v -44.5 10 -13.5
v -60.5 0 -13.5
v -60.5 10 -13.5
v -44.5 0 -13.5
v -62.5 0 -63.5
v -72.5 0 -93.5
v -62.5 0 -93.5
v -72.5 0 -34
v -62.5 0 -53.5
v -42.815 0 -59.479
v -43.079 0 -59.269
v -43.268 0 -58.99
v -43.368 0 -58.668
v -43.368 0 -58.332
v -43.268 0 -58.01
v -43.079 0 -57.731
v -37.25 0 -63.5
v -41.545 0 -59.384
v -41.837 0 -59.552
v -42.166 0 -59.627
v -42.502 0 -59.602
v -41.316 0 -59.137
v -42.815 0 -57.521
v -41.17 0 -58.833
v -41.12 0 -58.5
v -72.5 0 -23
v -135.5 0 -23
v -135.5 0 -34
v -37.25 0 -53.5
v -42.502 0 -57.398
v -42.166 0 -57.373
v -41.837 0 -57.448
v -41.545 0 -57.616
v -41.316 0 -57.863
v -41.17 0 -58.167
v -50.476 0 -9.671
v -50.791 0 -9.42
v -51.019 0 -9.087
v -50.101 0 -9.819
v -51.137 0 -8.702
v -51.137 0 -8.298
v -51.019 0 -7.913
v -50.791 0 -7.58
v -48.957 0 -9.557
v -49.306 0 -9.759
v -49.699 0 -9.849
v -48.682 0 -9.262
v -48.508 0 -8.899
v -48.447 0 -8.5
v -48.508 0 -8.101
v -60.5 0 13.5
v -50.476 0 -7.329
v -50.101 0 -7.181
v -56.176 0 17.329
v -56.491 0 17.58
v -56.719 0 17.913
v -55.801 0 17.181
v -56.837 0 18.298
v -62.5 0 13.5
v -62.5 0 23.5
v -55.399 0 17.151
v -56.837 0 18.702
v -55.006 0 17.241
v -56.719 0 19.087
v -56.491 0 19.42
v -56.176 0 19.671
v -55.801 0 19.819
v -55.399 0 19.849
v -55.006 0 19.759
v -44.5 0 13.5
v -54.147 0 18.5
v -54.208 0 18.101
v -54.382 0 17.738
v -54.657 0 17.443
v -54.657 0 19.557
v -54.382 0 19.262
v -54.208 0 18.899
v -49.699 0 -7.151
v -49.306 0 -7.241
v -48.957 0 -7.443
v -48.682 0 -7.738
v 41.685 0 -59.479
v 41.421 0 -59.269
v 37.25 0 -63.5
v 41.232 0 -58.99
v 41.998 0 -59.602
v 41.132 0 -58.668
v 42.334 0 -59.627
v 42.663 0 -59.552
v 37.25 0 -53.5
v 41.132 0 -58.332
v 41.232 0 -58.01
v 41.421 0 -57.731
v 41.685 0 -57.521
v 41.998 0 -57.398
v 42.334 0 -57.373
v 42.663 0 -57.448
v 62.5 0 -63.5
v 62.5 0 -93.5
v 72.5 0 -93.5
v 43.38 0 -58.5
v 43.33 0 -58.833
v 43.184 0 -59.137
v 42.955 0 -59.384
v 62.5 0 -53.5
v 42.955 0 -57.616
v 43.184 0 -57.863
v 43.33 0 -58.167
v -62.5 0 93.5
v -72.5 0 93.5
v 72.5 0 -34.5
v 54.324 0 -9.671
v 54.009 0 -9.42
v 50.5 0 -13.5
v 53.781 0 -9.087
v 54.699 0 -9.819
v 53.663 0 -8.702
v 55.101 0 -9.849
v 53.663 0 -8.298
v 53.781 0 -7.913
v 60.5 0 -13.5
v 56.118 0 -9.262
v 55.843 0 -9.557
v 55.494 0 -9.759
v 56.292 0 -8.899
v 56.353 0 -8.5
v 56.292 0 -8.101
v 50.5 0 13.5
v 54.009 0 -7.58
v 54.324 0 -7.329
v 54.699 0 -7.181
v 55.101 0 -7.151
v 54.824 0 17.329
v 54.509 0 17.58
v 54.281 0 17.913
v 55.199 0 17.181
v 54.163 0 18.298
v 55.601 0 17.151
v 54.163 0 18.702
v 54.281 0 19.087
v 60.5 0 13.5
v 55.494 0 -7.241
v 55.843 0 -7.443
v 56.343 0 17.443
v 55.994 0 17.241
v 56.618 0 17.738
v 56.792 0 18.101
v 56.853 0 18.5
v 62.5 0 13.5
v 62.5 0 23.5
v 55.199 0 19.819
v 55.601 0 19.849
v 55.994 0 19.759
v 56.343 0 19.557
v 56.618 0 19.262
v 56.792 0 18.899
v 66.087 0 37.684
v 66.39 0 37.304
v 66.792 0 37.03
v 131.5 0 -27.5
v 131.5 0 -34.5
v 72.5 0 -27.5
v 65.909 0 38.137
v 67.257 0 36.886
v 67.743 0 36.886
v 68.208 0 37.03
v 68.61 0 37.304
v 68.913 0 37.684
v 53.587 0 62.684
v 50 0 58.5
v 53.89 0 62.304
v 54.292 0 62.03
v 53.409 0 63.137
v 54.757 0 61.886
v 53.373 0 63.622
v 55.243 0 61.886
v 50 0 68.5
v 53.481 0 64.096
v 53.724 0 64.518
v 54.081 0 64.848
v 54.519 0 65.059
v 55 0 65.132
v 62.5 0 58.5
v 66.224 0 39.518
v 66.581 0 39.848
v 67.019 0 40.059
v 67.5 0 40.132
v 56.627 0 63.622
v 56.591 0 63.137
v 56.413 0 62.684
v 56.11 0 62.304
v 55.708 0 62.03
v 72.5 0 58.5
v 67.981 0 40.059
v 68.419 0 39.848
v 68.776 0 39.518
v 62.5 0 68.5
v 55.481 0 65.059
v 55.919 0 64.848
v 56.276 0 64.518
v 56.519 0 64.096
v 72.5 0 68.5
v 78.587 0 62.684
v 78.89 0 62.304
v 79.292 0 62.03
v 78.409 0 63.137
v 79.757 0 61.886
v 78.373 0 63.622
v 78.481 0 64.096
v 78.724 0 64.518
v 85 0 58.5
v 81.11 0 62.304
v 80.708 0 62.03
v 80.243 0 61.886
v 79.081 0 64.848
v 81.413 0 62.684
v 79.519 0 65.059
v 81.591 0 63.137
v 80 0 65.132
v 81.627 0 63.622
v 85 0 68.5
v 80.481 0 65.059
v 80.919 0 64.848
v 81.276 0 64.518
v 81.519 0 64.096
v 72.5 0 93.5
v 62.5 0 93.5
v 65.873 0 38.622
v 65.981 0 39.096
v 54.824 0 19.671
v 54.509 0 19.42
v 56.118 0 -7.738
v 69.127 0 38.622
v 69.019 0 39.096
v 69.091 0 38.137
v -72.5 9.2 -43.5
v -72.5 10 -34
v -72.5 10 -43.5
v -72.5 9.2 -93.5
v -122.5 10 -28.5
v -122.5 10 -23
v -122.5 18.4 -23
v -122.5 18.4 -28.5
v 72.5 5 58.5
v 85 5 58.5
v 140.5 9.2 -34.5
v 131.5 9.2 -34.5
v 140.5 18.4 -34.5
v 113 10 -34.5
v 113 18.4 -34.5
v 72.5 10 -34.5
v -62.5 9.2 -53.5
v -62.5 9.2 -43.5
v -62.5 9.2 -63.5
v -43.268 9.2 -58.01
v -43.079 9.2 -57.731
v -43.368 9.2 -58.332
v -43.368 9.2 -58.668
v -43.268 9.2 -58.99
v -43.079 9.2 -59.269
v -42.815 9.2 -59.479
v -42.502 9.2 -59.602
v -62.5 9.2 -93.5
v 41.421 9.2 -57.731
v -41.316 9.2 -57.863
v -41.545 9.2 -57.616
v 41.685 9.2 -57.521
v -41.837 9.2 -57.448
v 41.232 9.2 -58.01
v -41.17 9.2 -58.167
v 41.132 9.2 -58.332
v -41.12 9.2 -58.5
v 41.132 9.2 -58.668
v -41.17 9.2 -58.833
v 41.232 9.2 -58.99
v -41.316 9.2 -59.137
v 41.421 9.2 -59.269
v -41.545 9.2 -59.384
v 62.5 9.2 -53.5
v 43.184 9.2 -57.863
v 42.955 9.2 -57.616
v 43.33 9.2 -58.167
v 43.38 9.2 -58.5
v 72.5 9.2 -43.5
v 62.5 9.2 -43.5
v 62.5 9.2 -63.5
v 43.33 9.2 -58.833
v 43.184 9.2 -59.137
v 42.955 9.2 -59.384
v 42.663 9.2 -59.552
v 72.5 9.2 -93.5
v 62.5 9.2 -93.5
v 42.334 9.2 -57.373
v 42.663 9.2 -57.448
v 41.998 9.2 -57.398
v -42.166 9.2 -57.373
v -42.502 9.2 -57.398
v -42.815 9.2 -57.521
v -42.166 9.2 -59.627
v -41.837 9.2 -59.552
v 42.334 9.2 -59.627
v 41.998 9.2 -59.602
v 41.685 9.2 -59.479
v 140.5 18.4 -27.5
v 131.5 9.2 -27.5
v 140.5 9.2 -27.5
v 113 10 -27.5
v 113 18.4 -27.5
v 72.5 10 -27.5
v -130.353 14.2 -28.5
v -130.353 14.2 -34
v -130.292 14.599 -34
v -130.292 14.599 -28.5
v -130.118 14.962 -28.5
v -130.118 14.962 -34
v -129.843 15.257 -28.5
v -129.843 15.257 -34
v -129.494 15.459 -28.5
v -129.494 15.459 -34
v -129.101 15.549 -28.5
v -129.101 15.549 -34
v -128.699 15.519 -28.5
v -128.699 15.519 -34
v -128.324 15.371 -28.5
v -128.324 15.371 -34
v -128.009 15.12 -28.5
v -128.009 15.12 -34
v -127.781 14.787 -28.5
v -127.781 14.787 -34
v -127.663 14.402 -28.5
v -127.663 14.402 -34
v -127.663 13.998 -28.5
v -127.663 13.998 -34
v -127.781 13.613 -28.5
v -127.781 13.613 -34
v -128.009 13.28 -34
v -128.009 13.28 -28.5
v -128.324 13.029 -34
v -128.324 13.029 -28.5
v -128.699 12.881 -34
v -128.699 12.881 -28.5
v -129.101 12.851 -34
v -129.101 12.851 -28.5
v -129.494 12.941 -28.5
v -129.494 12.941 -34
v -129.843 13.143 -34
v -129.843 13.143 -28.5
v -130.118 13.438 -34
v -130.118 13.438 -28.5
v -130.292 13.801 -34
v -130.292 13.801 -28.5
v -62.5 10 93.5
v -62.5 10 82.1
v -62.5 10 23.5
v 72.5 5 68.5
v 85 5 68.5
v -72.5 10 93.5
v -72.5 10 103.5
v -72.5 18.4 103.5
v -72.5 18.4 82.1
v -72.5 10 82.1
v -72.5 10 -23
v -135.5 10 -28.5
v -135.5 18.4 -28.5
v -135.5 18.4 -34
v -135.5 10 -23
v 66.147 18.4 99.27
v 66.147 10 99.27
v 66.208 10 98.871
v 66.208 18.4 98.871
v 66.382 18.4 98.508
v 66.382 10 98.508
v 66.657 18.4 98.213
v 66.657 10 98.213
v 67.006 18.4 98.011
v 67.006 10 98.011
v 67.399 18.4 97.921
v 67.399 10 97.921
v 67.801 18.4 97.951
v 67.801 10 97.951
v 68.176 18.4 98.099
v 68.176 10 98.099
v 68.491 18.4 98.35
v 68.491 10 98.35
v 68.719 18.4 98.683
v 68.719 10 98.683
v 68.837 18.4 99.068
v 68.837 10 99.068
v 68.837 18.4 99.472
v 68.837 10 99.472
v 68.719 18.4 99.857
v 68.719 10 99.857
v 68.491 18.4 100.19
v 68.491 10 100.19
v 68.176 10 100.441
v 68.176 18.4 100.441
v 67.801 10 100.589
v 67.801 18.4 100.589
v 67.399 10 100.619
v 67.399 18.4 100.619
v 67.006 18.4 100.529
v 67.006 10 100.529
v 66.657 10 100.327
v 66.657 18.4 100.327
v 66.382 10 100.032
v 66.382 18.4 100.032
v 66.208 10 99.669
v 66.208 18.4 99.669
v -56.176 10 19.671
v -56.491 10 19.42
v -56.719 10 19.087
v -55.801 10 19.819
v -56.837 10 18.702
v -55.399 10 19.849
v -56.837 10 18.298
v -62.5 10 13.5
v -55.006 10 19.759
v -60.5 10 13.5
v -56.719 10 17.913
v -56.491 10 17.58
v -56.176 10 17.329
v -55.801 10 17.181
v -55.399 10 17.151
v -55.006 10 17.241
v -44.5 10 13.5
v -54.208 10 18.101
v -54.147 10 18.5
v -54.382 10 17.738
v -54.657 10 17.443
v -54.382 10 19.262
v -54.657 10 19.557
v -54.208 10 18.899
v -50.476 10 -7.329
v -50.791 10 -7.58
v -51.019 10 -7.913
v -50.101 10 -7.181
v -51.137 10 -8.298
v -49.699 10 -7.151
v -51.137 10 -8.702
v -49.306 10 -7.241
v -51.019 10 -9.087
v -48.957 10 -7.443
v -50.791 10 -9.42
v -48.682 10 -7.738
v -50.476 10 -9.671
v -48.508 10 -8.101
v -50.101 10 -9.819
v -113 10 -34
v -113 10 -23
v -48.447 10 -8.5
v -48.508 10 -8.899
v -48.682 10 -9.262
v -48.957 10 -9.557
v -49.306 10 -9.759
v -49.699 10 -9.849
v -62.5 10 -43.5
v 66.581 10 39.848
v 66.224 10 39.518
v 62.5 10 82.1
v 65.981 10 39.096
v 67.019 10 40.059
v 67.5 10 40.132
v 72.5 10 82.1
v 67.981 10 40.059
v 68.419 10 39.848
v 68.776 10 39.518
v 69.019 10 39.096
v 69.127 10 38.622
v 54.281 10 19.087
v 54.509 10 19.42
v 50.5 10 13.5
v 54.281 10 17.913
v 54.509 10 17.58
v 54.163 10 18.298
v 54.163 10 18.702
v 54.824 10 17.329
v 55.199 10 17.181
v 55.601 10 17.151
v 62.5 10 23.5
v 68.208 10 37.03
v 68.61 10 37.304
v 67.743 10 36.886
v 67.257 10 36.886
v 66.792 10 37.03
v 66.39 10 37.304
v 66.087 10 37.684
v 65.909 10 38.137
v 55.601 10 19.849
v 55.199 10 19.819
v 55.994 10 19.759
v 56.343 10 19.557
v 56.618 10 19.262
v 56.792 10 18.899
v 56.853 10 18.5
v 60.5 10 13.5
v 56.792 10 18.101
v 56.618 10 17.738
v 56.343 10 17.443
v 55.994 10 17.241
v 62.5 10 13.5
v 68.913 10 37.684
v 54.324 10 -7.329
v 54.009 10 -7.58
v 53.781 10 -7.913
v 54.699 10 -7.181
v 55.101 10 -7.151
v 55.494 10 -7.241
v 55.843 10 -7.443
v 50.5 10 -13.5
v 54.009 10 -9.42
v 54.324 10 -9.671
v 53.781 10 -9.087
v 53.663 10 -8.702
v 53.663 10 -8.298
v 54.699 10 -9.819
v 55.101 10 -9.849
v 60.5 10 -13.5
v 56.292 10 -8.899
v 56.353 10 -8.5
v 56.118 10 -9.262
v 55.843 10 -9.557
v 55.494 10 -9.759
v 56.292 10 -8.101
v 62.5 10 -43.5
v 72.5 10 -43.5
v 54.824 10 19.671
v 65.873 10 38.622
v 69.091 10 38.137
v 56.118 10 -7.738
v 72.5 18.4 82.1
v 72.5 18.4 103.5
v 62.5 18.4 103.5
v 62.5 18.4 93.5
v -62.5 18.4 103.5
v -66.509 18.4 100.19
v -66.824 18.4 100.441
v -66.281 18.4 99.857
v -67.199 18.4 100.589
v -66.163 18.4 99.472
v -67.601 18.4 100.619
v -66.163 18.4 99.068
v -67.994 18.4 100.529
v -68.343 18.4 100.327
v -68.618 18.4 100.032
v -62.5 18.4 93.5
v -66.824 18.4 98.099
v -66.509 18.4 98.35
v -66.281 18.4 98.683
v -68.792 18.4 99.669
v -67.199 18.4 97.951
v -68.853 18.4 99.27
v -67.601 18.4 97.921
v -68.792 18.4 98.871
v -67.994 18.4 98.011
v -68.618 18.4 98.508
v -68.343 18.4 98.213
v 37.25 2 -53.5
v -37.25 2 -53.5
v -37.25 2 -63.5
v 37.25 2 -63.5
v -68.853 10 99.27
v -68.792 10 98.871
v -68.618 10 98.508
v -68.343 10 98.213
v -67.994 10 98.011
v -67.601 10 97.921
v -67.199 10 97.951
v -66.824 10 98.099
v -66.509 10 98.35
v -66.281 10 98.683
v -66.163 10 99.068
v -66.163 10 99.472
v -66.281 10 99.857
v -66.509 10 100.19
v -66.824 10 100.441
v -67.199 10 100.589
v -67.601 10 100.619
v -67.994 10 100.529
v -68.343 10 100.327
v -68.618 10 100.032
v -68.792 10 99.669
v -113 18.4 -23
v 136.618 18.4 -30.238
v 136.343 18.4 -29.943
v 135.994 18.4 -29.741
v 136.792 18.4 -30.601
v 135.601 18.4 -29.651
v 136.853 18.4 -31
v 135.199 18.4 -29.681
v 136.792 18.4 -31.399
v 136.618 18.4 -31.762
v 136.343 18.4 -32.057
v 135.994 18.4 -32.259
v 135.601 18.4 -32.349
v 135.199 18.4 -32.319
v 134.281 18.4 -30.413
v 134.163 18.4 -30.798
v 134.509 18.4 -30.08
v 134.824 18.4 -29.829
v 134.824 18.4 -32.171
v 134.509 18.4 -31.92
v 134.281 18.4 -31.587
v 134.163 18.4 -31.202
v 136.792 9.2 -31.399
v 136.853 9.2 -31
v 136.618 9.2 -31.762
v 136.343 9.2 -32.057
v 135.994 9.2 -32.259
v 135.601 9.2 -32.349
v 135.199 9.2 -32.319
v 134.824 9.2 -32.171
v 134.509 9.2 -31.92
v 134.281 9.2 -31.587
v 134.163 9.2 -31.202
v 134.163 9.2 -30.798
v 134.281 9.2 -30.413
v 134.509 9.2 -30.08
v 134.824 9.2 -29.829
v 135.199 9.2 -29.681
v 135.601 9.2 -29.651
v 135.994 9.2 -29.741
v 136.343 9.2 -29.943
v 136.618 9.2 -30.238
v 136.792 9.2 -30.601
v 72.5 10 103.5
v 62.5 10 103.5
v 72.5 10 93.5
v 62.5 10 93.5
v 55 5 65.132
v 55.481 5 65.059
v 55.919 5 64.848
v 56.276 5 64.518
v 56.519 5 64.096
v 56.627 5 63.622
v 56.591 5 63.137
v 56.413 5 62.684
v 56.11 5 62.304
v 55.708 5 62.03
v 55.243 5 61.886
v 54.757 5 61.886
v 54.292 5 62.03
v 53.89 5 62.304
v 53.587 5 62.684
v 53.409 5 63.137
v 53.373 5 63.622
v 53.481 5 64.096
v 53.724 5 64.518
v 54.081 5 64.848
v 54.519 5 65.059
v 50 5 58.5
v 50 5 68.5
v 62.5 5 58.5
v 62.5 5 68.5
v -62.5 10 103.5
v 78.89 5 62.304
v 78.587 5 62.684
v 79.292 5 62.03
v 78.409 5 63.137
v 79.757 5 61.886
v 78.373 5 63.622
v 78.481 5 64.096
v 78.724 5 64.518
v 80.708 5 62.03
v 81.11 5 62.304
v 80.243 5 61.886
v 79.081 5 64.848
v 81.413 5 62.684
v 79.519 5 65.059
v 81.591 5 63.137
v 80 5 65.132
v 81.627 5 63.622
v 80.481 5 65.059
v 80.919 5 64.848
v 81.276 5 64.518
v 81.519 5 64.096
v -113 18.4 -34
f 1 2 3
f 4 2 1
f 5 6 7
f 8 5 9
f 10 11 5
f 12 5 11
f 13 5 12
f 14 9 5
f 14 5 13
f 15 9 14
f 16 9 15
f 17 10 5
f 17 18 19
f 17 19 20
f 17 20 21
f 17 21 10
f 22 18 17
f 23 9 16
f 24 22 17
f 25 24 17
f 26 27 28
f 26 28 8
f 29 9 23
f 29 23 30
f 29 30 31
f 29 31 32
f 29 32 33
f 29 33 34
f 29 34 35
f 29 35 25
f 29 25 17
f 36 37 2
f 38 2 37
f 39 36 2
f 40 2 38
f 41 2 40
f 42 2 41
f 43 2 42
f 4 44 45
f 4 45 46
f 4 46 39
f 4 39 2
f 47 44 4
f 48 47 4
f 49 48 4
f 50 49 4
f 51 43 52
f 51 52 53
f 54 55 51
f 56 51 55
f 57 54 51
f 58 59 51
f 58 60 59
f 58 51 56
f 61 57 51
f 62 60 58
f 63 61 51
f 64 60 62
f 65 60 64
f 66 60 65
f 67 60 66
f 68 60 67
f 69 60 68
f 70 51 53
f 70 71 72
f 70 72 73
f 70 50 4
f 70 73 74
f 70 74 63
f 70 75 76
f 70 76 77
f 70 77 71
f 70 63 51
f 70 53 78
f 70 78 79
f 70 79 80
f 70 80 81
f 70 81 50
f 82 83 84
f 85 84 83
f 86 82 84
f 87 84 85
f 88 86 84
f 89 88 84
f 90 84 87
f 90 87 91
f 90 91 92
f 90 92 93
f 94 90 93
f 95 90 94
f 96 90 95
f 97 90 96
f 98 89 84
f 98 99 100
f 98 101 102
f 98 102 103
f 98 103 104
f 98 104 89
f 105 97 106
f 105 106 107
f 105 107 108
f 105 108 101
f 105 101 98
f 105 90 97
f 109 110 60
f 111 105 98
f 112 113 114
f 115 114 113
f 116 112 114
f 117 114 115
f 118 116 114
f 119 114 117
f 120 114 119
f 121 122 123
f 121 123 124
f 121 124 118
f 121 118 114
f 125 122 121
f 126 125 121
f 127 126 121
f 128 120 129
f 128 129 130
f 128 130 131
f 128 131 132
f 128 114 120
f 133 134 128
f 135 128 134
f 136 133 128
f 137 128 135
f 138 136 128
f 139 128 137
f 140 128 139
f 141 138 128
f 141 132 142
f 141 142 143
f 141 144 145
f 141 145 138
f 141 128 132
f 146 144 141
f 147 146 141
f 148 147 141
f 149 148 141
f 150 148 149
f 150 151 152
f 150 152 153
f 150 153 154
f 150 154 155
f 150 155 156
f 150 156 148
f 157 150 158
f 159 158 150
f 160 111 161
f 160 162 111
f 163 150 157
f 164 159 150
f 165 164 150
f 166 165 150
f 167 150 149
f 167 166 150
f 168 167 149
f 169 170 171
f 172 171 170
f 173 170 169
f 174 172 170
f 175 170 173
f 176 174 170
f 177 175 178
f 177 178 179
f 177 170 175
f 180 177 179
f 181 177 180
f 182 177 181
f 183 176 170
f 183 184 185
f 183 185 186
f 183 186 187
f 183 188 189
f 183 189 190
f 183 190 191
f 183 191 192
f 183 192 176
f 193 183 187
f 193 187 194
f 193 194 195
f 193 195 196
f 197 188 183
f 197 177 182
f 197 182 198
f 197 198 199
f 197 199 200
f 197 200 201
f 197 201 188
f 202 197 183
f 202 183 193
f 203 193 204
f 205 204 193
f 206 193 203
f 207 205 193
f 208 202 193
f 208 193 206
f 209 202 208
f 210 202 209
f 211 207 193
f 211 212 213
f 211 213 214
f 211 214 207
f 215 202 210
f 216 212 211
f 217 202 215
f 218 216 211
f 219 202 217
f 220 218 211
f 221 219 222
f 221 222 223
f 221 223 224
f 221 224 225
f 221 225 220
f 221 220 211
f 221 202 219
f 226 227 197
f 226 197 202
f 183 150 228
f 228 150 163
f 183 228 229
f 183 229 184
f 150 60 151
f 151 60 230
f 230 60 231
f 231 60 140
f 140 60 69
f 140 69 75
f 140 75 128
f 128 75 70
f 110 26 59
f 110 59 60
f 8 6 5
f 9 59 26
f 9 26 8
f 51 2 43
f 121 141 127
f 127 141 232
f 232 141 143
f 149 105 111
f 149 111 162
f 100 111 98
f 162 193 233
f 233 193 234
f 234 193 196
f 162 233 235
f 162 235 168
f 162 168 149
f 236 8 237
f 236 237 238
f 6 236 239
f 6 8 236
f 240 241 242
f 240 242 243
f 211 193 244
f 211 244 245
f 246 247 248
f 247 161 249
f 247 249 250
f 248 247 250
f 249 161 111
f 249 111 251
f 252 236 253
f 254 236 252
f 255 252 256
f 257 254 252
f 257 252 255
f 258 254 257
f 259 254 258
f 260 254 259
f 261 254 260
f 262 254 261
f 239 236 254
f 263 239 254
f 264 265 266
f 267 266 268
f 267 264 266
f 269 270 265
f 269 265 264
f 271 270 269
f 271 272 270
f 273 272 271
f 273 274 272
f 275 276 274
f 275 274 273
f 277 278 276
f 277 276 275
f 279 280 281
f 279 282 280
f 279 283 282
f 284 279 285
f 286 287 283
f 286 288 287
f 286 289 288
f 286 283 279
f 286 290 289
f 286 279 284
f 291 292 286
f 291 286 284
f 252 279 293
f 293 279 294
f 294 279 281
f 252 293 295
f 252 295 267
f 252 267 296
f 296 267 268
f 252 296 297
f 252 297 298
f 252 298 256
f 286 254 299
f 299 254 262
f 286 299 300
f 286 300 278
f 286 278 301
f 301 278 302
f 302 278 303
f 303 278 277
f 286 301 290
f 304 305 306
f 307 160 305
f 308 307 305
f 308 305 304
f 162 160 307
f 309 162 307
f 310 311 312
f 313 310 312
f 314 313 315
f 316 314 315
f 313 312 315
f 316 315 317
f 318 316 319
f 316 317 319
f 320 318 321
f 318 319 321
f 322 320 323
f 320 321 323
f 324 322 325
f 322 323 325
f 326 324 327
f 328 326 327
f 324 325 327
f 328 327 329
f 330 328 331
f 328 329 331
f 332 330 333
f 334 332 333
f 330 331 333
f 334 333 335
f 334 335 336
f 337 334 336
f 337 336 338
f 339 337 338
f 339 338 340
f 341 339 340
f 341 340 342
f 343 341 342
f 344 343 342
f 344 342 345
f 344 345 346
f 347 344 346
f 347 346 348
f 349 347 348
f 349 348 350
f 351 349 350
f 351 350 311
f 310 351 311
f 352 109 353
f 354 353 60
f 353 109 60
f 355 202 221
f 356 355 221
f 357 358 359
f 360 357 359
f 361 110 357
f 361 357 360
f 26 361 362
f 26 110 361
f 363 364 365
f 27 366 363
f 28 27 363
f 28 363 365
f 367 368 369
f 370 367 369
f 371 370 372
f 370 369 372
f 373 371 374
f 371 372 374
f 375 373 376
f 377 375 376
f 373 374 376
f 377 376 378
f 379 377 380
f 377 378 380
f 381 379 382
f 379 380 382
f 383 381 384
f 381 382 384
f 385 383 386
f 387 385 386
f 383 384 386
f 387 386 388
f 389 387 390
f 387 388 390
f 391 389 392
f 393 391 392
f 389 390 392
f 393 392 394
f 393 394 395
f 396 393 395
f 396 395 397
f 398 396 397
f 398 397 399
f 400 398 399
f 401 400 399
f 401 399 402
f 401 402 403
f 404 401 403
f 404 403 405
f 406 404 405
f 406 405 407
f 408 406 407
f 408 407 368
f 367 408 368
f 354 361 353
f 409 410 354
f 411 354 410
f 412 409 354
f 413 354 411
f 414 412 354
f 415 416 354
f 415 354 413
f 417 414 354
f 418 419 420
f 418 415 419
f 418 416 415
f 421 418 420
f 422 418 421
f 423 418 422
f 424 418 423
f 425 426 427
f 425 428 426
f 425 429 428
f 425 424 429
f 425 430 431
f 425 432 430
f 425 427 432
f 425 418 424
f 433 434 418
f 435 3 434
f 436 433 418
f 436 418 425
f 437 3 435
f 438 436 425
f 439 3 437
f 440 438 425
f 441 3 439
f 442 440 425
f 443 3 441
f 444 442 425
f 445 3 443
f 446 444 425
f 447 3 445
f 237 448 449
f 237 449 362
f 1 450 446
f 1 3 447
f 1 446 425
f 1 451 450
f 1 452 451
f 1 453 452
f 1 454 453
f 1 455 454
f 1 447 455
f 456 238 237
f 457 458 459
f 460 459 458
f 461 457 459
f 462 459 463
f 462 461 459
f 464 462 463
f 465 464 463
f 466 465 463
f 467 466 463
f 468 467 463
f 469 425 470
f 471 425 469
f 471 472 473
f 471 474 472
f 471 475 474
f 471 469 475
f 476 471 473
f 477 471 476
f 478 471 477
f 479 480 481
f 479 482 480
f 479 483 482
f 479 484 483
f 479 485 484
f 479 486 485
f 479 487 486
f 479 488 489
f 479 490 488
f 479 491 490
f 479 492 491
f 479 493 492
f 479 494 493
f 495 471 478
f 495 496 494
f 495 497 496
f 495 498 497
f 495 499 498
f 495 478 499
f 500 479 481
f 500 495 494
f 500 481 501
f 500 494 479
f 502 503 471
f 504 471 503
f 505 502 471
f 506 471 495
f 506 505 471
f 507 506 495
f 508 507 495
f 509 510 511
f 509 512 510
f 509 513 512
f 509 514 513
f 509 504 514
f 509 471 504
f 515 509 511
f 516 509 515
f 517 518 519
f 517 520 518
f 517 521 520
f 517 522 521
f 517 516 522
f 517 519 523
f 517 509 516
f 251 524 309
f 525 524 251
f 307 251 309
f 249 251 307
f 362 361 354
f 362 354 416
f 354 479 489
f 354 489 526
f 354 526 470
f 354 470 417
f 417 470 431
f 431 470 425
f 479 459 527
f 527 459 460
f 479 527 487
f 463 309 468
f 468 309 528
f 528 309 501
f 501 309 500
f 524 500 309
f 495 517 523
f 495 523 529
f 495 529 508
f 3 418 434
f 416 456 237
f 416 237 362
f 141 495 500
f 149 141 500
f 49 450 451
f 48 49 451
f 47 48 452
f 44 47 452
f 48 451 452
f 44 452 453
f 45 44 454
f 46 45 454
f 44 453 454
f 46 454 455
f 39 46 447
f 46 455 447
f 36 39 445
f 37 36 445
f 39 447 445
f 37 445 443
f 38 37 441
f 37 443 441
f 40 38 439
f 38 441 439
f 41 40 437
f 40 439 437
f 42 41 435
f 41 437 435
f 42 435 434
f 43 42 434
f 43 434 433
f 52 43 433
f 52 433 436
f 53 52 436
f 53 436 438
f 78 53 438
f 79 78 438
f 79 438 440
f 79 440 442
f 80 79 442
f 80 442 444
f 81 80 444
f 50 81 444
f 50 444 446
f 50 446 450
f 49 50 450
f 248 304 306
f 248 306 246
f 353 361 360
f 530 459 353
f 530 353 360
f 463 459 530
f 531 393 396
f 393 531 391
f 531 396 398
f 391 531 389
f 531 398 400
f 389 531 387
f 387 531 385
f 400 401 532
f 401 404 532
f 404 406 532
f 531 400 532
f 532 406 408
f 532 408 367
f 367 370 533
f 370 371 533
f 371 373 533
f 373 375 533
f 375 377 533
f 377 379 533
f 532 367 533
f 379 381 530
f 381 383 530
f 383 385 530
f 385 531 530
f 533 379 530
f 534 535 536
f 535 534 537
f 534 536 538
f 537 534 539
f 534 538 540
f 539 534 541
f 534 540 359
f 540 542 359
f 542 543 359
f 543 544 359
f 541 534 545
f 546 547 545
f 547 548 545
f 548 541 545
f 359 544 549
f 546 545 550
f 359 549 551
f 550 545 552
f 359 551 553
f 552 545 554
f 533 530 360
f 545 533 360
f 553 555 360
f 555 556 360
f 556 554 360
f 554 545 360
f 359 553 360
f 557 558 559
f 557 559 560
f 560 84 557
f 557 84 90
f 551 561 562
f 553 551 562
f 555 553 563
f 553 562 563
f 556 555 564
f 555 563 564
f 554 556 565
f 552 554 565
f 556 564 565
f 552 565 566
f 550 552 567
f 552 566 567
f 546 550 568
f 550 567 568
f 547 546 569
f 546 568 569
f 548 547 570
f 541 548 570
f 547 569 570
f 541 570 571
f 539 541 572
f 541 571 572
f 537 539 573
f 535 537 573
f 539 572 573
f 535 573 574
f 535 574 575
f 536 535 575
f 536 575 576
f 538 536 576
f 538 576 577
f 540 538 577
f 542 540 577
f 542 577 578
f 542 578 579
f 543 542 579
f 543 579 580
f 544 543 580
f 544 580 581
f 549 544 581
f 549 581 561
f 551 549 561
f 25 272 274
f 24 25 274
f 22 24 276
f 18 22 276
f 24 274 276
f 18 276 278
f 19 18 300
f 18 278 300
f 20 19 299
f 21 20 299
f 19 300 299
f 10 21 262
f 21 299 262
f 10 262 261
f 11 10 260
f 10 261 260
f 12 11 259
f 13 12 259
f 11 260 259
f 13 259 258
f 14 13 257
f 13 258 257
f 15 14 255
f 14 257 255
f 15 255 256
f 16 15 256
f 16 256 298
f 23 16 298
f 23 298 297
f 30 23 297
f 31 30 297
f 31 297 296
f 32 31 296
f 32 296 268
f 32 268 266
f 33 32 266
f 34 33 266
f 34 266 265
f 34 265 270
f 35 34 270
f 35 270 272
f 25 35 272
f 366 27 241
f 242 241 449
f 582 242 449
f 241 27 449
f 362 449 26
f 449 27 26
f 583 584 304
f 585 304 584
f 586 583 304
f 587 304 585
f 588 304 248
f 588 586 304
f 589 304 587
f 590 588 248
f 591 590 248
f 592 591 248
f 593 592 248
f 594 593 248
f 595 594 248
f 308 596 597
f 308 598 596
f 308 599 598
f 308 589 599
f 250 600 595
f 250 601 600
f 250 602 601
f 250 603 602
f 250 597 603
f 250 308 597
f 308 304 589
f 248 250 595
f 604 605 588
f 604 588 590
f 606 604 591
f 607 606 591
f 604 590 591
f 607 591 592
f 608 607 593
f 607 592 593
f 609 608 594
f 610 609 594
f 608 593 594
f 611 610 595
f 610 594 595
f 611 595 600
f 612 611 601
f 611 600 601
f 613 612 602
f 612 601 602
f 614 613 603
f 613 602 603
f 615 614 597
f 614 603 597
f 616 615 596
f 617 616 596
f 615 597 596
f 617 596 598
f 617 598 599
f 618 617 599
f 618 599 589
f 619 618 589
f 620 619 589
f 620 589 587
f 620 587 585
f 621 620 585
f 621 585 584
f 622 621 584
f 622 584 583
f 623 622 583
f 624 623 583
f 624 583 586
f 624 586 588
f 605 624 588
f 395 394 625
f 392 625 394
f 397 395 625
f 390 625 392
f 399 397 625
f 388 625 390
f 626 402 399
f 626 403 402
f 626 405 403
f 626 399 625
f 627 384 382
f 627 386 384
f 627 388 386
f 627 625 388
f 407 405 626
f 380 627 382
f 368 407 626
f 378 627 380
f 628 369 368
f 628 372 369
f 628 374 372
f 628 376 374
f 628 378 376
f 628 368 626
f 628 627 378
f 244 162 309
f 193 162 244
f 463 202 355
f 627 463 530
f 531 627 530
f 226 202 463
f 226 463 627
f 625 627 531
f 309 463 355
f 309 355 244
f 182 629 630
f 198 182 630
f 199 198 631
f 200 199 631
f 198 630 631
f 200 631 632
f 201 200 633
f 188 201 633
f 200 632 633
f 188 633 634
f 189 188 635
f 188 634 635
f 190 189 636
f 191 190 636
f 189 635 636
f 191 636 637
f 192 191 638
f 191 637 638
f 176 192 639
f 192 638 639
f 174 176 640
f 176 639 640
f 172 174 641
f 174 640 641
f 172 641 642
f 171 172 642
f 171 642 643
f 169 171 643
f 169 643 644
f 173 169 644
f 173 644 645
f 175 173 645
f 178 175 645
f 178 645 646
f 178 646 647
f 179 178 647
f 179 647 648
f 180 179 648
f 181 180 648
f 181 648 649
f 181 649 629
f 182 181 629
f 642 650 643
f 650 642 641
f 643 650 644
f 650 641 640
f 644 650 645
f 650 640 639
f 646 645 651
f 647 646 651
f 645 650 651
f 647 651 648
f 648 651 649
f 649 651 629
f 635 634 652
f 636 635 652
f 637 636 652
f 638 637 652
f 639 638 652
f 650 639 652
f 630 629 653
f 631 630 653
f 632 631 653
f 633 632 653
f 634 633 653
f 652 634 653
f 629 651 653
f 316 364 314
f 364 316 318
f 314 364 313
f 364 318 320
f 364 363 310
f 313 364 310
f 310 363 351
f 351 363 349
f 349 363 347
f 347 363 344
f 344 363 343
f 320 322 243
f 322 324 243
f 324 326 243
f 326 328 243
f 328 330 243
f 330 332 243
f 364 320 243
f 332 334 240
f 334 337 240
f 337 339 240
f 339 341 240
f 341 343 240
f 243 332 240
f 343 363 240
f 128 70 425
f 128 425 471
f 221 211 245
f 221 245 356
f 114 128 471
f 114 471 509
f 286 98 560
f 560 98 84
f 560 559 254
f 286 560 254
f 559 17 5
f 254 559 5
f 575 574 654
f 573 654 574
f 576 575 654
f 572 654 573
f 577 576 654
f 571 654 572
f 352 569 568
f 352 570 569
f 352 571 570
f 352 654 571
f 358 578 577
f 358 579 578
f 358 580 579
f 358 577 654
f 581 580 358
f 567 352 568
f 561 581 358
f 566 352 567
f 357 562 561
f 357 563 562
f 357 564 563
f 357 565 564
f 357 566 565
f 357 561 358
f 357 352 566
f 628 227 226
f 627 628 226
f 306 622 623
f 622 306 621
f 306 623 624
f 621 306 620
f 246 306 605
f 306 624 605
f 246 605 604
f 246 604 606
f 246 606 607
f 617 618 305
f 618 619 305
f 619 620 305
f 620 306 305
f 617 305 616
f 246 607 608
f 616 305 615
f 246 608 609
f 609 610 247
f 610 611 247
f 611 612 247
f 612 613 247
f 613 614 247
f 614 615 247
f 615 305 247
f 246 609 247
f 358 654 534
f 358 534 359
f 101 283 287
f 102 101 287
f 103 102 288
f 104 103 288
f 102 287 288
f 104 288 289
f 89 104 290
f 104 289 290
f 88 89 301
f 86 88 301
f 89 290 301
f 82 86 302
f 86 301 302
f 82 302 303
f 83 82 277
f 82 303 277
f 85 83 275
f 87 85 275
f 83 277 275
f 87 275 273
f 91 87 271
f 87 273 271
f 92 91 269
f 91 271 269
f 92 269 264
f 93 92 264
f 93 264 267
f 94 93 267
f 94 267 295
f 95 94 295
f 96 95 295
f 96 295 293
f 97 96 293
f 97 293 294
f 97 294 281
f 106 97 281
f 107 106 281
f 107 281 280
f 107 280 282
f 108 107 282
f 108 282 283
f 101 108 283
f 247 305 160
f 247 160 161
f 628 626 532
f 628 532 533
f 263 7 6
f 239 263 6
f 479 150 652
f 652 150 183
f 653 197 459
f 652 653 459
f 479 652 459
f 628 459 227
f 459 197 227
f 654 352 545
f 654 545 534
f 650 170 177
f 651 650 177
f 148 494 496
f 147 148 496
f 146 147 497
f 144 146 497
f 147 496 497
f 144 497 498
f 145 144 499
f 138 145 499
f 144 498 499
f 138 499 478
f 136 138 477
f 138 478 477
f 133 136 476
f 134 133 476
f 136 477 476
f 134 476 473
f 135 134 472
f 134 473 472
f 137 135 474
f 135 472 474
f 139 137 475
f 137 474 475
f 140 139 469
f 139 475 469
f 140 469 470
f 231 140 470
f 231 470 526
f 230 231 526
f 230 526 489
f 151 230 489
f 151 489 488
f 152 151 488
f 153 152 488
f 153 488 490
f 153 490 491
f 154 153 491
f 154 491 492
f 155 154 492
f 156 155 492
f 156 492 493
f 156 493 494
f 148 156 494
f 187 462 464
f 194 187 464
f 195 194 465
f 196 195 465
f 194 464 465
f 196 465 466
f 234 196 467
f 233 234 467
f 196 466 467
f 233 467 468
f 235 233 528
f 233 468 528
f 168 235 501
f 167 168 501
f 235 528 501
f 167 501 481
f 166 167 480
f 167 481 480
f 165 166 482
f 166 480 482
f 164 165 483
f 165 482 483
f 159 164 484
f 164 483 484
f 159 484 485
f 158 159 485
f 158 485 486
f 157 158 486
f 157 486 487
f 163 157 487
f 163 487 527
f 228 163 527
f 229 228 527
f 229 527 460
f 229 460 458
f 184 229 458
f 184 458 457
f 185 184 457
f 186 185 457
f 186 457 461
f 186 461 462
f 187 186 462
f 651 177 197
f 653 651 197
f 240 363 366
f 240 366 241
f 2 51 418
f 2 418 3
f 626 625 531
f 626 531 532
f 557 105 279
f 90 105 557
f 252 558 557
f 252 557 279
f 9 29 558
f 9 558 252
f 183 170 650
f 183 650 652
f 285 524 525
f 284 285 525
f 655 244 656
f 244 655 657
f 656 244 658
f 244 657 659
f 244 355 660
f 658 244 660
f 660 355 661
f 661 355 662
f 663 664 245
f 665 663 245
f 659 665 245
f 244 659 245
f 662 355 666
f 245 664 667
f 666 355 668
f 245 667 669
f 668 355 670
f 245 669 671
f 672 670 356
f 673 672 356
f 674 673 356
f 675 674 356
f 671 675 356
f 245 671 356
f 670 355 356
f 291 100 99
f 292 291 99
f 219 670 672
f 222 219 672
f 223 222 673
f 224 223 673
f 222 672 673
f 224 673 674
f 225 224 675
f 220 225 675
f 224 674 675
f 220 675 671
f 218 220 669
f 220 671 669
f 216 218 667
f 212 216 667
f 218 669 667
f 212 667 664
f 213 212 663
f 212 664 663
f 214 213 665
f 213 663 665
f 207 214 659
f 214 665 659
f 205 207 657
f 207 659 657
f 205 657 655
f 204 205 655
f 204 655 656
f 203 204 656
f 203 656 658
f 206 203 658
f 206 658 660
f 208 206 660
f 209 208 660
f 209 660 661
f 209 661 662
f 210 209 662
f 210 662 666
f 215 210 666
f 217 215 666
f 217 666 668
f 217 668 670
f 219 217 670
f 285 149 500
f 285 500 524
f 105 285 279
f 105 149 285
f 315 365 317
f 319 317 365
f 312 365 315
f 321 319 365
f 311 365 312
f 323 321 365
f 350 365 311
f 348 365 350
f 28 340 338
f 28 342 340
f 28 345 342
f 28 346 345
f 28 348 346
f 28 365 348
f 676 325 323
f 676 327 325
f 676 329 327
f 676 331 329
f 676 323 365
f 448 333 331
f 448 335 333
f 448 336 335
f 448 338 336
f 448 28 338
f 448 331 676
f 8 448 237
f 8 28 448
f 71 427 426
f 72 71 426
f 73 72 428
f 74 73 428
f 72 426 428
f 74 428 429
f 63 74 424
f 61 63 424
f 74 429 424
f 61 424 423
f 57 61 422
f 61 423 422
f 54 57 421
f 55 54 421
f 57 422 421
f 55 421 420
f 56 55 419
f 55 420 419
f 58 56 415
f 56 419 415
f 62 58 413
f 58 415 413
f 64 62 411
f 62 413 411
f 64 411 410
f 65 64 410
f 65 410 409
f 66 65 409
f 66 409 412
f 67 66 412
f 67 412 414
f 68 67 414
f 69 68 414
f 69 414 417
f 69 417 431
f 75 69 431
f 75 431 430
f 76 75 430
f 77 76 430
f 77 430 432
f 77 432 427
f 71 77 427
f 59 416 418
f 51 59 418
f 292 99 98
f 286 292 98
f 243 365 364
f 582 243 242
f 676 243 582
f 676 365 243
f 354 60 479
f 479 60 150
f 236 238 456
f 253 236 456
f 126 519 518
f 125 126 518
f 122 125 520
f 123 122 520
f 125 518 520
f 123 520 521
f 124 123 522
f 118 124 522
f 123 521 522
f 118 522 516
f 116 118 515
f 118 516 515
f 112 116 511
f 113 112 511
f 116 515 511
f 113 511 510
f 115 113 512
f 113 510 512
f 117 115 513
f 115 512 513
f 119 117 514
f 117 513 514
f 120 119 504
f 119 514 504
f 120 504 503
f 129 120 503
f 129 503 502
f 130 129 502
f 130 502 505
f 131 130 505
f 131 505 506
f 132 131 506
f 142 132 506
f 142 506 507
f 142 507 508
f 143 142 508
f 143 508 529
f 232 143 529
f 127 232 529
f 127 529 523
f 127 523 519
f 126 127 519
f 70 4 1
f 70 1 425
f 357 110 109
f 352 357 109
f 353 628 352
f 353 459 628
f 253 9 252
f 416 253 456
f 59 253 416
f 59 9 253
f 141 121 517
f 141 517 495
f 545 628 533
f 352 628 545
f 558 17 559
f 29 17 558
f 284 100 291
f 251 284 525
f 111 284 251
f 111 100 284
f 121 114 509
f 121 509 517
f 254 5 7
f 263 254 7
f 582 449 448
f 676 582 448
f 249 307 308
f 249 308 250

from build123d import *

# Parameters (mm, degrees)
FRAME_DEPTH                = 10
SKETCH10_W                 = 145
SKETCH10_H                 = 50
CUT_EXTRUDE1_DEPTH         = 0.8
F_6_32_TAPPED_HOLE2_D      = 2.7051
F_4_40_TAPPED_HOLE1_D      = 2.2606
BOTTOM_LEGS_DEPTH          = 8.4
SIDE_ARMS_S_W              = 63
SIDE_ARMS_S_H              = 11
SIDE_ARMS_S_W_2            = 59
SIDE_ARMS_S_H_2            = 7
SIDE_ARMS_DEPTH            = 10
SIDE_TABS_S_W              = 13
SIDE_TABS_S_H              = 5.5
SIDE_TABS_S_W_2            = 9
SIDE_TABS_S_H_2            = 7
SIDE_TABS_DEPTH            = 8.4
BOTTOM_SCREWS_D            = 2.7051
LEFT_SCREW_D               = 2.7051
RIGHT_FOOT_S_W             = 7
RIGHT_FOOT_S_H             = 9.2
RIGHT_FOOT_DEPTH           = 9
RIGHT_SCREW_D              = 2.7051
CONTROL_BOARD_RELIEF_S_W   = 74.5
CONTROL_BOARD_RELIEF_S_H   = 10
CONTROL_BOARD_RELIEF_DEPTH = 2
MONITOR_SIDE_GUIDES_S_W    = 9.5
MONITOR_SIDE_GUIDES_S_H    = 11
MONITOR_SIDE_GUIDES_S_H_2  = 7
SIDE_MONITOR_GUIDES_DEPTH  = 8.4
LED_BOARD_S_W              = 35
LED_BOARD_S_H              = 10
LED_BOARD_DEPTH            = 5
F_4_CLEARANCE_HOLE1_D      = 3.2639
F_4_CLEARANCE_HOLE1_DEPTH  = 10


with BuildPart() as part:
    # Sketch1 → frame (new body)
    with BuildSketch(Plane(origin=(0, 0, 0), x_dir=(1, 0, 0), z_dir=(0, 1, 0))):
        Polygon((-72.5, 93.5), (-72.5, -93.5), (-62.5, -93.5), (-62.5, -23.5), (62.5, -23.5), (62.5, -93.5), (72.5, -93.5), (72.5, 93.5), (62.5, 93.5), (62.5, 63.5), (-62.5, 63.5), (-62.5, 93.5), align=None)
        Polygon((-62.5, -13.5), (-60.5, -13.5), (-60.5, 13.5), (-44.5, 13.5), (-44.5, -13.5), (50.5, -13.5), (50.5, 13.5), (60.5, 13.5), (60.5, -13.5), (62.5, -13.5), (62.5, 53.5), (-62.5, 53.5), align=None, mode=Mode.SUBTRACT)
    extrude(amount=FRAME_DEPTH)

    # Sketch10 → Cut-Extrude1 (cut)
    with BuildSketch(Plane(origin=(0, 10, 0), x_dir=(1, 0, 0), z_dir=(0, 1, 0))):
        with Locations((0, 68.5)):
            Rectangle(SKETCH10_W, SKETCH10_H)
    extrude(amount=-CUT_EXTRUDE1_DEPTH, mode=Mode.SUBTRACT)

    # #6-32 Tapped Hole2 (through all)
    with Locations(Plane(origin=(0, 0, 0), x_dir=(-1, 0, 0), z_dir=(0, -1, 0))):
        with Locations((55.5, -18.5), (49.8, 8.5), (-55, 8.5), (-55.5, -18.5)):
            Hole(F_6_32_TAPPED_HOLE2_D / 2)

    # #4-40 Tapped Hole1 (through all)
    with Locations(Plane(origin=(0, 0, 0), x_dir=(-1, 0, 0), z_dir=(0, -1, 0))):
        with Locations((42.25, 58.5), (-42.25, 58.5)):
            Hole(F_4_40_TAPPED_HOLE1_D / 2)

    # bottom-legs-s → bottom-legs (add)
    with BuildSketch(Plane(origin=(0, 10, 0), x_dir=(1, 0, 0), z_dir=(0, 1, 0))):
        Polygon((-72.5, -103.5), (-72.5, -82.1), (72.5, -82.1), (72.5, -103.5), (62.5, -103.5), (62.5, -93.5), (-62.5, -93.5), (-62.5, -103.5), align=None)
    extrude(amount=BOTTOM_LEGS_DEPTH)

    # side-arms-s → side-arms (add)
    with BuildSketch(Plane(origin=(0, 10, 0), x_dir=(1, 0, 0), z_dir=(0, 1, 0))):
        with Locations((-104, 28.5)):
            Rectangle(SIDE_ARMS_S_W, SIDE_ARMS_S_H)
        with Locations((102, 31)):
            Rectangle(SIDE_ARMS_S_W_2, SIDE_ARMS_S_H_2)
    extrude(amount=-SIDE_ARMS_DEPTH)

    # side-tabs-s → side-tabs (add)
    with BuildSketch(Plane(origin=(0, 10, 0), x_dir=(1, 0, 0), z_dir=(0, 1, 0))):
        with Locations((-129, 31.25)):
            Rectangle(SIDE_TABS_S_W, SIDE_TABS_S_H)
        with Locations((127, 31)):
            Rectangle(SIDE_TABS_S_W_2, SIDE_TABS_S_H_2)
    extrude(amount=SIDE_TABS_DEPTH)

    # bottom-screws (through all)
    with Locations(Plane(origin=(0, 18.4, 0), x_dir=(1, 0, 0), z_dir=(0, 1, 0))):
        with Locations((-67.5, -99.27), (67.5, -99.27)):
            Hole(BOTTOM_SCREWS_D / 2)

    # left-screw (through all)
    with Locations(Plane.XY.offset(-28.5)):
        with Locations((-129, 14.2)):
            Hole(LEFT_SCREW_D / 2)

    # right-foot-s → right-foot (add)
    with BuildSketch(Plane(origin=(131.5, 0, 0), x_dir=(0, 0, -1), z_dir=(1, 0, 0))):
        with Locations((31, 13.8)):
            Rectangle(RIGHT_FOOT_S_W, RIGHT_FOOT_S_H)
    extrude(amount=RIGHT_FOOT_DEPTH)

    # right-screw (through all)
    with Locations(Plane(origin=(0, 9.2, 0), x_dir=(-1, 0, 0), z_dir=(0, -1, 0))):
        with Locations((-135.5, 31)):
            Hole(RIGHT_SCREW_D / 2)

    # control-board-relief-s → control-board-relief (cut)
    with BuildSketch(Plane.XZ):
        with Locations((0, -58.5)):
            Rectangle(CONTROL_BOARD_RELIEF_S_W, CONTROL_BOARD_RELIEF_S_H)
    extrude(amount=-CONTROL_BOARD_RELIEF_DEPTH, mode=Mode.SUBTRACT)

    # monitor-side-guides-s → side-monitor-guides (add)
    with BuildSketch(Plane(origin=(0, 10, 0), x_dir=(1, 0, 0), z_dir=(0, 1, 0))):
        with Locations((-117.75, 28.5)):
            Rectangle(MONITOR_SIDE_GUIDES_S_W, MONITOR_SIDE_GUIDES_S_H)
        with Locations((117.75, 31)):
            Rectangle(MONITOR_SIDE_GUIDES_S_W, MONITOR_SIDE_GUIDES_S_H_2)
    extrude(amount=SIDE_MONITOR_GUIDES_DEPTH)

    # led-board-s → led-board (add)
    with BuildSketch(Plane.XZ):
        with Locations((67.5, 63.5)):
            Rectangle(LED_BOARD_S_W, LED_BOARD_S_H)
    extrude(amount=-LED_BOARD_DEPTH)

    # #4 Clearance Hole1
    with Locations(Plane(origin=(67.5, 0, 38.5), x_dir=(0, 0, -1), z_dir=(0, -1, 0))):
        with Locations((0, 0), (-25, 12.5), (-25, -12.5)):
            Hole(F_4_CLEARANCE_HOLE1_D / 2, depth=F_4_CLEARANCE_HOLE1_DEPTH)


solid = part.part
